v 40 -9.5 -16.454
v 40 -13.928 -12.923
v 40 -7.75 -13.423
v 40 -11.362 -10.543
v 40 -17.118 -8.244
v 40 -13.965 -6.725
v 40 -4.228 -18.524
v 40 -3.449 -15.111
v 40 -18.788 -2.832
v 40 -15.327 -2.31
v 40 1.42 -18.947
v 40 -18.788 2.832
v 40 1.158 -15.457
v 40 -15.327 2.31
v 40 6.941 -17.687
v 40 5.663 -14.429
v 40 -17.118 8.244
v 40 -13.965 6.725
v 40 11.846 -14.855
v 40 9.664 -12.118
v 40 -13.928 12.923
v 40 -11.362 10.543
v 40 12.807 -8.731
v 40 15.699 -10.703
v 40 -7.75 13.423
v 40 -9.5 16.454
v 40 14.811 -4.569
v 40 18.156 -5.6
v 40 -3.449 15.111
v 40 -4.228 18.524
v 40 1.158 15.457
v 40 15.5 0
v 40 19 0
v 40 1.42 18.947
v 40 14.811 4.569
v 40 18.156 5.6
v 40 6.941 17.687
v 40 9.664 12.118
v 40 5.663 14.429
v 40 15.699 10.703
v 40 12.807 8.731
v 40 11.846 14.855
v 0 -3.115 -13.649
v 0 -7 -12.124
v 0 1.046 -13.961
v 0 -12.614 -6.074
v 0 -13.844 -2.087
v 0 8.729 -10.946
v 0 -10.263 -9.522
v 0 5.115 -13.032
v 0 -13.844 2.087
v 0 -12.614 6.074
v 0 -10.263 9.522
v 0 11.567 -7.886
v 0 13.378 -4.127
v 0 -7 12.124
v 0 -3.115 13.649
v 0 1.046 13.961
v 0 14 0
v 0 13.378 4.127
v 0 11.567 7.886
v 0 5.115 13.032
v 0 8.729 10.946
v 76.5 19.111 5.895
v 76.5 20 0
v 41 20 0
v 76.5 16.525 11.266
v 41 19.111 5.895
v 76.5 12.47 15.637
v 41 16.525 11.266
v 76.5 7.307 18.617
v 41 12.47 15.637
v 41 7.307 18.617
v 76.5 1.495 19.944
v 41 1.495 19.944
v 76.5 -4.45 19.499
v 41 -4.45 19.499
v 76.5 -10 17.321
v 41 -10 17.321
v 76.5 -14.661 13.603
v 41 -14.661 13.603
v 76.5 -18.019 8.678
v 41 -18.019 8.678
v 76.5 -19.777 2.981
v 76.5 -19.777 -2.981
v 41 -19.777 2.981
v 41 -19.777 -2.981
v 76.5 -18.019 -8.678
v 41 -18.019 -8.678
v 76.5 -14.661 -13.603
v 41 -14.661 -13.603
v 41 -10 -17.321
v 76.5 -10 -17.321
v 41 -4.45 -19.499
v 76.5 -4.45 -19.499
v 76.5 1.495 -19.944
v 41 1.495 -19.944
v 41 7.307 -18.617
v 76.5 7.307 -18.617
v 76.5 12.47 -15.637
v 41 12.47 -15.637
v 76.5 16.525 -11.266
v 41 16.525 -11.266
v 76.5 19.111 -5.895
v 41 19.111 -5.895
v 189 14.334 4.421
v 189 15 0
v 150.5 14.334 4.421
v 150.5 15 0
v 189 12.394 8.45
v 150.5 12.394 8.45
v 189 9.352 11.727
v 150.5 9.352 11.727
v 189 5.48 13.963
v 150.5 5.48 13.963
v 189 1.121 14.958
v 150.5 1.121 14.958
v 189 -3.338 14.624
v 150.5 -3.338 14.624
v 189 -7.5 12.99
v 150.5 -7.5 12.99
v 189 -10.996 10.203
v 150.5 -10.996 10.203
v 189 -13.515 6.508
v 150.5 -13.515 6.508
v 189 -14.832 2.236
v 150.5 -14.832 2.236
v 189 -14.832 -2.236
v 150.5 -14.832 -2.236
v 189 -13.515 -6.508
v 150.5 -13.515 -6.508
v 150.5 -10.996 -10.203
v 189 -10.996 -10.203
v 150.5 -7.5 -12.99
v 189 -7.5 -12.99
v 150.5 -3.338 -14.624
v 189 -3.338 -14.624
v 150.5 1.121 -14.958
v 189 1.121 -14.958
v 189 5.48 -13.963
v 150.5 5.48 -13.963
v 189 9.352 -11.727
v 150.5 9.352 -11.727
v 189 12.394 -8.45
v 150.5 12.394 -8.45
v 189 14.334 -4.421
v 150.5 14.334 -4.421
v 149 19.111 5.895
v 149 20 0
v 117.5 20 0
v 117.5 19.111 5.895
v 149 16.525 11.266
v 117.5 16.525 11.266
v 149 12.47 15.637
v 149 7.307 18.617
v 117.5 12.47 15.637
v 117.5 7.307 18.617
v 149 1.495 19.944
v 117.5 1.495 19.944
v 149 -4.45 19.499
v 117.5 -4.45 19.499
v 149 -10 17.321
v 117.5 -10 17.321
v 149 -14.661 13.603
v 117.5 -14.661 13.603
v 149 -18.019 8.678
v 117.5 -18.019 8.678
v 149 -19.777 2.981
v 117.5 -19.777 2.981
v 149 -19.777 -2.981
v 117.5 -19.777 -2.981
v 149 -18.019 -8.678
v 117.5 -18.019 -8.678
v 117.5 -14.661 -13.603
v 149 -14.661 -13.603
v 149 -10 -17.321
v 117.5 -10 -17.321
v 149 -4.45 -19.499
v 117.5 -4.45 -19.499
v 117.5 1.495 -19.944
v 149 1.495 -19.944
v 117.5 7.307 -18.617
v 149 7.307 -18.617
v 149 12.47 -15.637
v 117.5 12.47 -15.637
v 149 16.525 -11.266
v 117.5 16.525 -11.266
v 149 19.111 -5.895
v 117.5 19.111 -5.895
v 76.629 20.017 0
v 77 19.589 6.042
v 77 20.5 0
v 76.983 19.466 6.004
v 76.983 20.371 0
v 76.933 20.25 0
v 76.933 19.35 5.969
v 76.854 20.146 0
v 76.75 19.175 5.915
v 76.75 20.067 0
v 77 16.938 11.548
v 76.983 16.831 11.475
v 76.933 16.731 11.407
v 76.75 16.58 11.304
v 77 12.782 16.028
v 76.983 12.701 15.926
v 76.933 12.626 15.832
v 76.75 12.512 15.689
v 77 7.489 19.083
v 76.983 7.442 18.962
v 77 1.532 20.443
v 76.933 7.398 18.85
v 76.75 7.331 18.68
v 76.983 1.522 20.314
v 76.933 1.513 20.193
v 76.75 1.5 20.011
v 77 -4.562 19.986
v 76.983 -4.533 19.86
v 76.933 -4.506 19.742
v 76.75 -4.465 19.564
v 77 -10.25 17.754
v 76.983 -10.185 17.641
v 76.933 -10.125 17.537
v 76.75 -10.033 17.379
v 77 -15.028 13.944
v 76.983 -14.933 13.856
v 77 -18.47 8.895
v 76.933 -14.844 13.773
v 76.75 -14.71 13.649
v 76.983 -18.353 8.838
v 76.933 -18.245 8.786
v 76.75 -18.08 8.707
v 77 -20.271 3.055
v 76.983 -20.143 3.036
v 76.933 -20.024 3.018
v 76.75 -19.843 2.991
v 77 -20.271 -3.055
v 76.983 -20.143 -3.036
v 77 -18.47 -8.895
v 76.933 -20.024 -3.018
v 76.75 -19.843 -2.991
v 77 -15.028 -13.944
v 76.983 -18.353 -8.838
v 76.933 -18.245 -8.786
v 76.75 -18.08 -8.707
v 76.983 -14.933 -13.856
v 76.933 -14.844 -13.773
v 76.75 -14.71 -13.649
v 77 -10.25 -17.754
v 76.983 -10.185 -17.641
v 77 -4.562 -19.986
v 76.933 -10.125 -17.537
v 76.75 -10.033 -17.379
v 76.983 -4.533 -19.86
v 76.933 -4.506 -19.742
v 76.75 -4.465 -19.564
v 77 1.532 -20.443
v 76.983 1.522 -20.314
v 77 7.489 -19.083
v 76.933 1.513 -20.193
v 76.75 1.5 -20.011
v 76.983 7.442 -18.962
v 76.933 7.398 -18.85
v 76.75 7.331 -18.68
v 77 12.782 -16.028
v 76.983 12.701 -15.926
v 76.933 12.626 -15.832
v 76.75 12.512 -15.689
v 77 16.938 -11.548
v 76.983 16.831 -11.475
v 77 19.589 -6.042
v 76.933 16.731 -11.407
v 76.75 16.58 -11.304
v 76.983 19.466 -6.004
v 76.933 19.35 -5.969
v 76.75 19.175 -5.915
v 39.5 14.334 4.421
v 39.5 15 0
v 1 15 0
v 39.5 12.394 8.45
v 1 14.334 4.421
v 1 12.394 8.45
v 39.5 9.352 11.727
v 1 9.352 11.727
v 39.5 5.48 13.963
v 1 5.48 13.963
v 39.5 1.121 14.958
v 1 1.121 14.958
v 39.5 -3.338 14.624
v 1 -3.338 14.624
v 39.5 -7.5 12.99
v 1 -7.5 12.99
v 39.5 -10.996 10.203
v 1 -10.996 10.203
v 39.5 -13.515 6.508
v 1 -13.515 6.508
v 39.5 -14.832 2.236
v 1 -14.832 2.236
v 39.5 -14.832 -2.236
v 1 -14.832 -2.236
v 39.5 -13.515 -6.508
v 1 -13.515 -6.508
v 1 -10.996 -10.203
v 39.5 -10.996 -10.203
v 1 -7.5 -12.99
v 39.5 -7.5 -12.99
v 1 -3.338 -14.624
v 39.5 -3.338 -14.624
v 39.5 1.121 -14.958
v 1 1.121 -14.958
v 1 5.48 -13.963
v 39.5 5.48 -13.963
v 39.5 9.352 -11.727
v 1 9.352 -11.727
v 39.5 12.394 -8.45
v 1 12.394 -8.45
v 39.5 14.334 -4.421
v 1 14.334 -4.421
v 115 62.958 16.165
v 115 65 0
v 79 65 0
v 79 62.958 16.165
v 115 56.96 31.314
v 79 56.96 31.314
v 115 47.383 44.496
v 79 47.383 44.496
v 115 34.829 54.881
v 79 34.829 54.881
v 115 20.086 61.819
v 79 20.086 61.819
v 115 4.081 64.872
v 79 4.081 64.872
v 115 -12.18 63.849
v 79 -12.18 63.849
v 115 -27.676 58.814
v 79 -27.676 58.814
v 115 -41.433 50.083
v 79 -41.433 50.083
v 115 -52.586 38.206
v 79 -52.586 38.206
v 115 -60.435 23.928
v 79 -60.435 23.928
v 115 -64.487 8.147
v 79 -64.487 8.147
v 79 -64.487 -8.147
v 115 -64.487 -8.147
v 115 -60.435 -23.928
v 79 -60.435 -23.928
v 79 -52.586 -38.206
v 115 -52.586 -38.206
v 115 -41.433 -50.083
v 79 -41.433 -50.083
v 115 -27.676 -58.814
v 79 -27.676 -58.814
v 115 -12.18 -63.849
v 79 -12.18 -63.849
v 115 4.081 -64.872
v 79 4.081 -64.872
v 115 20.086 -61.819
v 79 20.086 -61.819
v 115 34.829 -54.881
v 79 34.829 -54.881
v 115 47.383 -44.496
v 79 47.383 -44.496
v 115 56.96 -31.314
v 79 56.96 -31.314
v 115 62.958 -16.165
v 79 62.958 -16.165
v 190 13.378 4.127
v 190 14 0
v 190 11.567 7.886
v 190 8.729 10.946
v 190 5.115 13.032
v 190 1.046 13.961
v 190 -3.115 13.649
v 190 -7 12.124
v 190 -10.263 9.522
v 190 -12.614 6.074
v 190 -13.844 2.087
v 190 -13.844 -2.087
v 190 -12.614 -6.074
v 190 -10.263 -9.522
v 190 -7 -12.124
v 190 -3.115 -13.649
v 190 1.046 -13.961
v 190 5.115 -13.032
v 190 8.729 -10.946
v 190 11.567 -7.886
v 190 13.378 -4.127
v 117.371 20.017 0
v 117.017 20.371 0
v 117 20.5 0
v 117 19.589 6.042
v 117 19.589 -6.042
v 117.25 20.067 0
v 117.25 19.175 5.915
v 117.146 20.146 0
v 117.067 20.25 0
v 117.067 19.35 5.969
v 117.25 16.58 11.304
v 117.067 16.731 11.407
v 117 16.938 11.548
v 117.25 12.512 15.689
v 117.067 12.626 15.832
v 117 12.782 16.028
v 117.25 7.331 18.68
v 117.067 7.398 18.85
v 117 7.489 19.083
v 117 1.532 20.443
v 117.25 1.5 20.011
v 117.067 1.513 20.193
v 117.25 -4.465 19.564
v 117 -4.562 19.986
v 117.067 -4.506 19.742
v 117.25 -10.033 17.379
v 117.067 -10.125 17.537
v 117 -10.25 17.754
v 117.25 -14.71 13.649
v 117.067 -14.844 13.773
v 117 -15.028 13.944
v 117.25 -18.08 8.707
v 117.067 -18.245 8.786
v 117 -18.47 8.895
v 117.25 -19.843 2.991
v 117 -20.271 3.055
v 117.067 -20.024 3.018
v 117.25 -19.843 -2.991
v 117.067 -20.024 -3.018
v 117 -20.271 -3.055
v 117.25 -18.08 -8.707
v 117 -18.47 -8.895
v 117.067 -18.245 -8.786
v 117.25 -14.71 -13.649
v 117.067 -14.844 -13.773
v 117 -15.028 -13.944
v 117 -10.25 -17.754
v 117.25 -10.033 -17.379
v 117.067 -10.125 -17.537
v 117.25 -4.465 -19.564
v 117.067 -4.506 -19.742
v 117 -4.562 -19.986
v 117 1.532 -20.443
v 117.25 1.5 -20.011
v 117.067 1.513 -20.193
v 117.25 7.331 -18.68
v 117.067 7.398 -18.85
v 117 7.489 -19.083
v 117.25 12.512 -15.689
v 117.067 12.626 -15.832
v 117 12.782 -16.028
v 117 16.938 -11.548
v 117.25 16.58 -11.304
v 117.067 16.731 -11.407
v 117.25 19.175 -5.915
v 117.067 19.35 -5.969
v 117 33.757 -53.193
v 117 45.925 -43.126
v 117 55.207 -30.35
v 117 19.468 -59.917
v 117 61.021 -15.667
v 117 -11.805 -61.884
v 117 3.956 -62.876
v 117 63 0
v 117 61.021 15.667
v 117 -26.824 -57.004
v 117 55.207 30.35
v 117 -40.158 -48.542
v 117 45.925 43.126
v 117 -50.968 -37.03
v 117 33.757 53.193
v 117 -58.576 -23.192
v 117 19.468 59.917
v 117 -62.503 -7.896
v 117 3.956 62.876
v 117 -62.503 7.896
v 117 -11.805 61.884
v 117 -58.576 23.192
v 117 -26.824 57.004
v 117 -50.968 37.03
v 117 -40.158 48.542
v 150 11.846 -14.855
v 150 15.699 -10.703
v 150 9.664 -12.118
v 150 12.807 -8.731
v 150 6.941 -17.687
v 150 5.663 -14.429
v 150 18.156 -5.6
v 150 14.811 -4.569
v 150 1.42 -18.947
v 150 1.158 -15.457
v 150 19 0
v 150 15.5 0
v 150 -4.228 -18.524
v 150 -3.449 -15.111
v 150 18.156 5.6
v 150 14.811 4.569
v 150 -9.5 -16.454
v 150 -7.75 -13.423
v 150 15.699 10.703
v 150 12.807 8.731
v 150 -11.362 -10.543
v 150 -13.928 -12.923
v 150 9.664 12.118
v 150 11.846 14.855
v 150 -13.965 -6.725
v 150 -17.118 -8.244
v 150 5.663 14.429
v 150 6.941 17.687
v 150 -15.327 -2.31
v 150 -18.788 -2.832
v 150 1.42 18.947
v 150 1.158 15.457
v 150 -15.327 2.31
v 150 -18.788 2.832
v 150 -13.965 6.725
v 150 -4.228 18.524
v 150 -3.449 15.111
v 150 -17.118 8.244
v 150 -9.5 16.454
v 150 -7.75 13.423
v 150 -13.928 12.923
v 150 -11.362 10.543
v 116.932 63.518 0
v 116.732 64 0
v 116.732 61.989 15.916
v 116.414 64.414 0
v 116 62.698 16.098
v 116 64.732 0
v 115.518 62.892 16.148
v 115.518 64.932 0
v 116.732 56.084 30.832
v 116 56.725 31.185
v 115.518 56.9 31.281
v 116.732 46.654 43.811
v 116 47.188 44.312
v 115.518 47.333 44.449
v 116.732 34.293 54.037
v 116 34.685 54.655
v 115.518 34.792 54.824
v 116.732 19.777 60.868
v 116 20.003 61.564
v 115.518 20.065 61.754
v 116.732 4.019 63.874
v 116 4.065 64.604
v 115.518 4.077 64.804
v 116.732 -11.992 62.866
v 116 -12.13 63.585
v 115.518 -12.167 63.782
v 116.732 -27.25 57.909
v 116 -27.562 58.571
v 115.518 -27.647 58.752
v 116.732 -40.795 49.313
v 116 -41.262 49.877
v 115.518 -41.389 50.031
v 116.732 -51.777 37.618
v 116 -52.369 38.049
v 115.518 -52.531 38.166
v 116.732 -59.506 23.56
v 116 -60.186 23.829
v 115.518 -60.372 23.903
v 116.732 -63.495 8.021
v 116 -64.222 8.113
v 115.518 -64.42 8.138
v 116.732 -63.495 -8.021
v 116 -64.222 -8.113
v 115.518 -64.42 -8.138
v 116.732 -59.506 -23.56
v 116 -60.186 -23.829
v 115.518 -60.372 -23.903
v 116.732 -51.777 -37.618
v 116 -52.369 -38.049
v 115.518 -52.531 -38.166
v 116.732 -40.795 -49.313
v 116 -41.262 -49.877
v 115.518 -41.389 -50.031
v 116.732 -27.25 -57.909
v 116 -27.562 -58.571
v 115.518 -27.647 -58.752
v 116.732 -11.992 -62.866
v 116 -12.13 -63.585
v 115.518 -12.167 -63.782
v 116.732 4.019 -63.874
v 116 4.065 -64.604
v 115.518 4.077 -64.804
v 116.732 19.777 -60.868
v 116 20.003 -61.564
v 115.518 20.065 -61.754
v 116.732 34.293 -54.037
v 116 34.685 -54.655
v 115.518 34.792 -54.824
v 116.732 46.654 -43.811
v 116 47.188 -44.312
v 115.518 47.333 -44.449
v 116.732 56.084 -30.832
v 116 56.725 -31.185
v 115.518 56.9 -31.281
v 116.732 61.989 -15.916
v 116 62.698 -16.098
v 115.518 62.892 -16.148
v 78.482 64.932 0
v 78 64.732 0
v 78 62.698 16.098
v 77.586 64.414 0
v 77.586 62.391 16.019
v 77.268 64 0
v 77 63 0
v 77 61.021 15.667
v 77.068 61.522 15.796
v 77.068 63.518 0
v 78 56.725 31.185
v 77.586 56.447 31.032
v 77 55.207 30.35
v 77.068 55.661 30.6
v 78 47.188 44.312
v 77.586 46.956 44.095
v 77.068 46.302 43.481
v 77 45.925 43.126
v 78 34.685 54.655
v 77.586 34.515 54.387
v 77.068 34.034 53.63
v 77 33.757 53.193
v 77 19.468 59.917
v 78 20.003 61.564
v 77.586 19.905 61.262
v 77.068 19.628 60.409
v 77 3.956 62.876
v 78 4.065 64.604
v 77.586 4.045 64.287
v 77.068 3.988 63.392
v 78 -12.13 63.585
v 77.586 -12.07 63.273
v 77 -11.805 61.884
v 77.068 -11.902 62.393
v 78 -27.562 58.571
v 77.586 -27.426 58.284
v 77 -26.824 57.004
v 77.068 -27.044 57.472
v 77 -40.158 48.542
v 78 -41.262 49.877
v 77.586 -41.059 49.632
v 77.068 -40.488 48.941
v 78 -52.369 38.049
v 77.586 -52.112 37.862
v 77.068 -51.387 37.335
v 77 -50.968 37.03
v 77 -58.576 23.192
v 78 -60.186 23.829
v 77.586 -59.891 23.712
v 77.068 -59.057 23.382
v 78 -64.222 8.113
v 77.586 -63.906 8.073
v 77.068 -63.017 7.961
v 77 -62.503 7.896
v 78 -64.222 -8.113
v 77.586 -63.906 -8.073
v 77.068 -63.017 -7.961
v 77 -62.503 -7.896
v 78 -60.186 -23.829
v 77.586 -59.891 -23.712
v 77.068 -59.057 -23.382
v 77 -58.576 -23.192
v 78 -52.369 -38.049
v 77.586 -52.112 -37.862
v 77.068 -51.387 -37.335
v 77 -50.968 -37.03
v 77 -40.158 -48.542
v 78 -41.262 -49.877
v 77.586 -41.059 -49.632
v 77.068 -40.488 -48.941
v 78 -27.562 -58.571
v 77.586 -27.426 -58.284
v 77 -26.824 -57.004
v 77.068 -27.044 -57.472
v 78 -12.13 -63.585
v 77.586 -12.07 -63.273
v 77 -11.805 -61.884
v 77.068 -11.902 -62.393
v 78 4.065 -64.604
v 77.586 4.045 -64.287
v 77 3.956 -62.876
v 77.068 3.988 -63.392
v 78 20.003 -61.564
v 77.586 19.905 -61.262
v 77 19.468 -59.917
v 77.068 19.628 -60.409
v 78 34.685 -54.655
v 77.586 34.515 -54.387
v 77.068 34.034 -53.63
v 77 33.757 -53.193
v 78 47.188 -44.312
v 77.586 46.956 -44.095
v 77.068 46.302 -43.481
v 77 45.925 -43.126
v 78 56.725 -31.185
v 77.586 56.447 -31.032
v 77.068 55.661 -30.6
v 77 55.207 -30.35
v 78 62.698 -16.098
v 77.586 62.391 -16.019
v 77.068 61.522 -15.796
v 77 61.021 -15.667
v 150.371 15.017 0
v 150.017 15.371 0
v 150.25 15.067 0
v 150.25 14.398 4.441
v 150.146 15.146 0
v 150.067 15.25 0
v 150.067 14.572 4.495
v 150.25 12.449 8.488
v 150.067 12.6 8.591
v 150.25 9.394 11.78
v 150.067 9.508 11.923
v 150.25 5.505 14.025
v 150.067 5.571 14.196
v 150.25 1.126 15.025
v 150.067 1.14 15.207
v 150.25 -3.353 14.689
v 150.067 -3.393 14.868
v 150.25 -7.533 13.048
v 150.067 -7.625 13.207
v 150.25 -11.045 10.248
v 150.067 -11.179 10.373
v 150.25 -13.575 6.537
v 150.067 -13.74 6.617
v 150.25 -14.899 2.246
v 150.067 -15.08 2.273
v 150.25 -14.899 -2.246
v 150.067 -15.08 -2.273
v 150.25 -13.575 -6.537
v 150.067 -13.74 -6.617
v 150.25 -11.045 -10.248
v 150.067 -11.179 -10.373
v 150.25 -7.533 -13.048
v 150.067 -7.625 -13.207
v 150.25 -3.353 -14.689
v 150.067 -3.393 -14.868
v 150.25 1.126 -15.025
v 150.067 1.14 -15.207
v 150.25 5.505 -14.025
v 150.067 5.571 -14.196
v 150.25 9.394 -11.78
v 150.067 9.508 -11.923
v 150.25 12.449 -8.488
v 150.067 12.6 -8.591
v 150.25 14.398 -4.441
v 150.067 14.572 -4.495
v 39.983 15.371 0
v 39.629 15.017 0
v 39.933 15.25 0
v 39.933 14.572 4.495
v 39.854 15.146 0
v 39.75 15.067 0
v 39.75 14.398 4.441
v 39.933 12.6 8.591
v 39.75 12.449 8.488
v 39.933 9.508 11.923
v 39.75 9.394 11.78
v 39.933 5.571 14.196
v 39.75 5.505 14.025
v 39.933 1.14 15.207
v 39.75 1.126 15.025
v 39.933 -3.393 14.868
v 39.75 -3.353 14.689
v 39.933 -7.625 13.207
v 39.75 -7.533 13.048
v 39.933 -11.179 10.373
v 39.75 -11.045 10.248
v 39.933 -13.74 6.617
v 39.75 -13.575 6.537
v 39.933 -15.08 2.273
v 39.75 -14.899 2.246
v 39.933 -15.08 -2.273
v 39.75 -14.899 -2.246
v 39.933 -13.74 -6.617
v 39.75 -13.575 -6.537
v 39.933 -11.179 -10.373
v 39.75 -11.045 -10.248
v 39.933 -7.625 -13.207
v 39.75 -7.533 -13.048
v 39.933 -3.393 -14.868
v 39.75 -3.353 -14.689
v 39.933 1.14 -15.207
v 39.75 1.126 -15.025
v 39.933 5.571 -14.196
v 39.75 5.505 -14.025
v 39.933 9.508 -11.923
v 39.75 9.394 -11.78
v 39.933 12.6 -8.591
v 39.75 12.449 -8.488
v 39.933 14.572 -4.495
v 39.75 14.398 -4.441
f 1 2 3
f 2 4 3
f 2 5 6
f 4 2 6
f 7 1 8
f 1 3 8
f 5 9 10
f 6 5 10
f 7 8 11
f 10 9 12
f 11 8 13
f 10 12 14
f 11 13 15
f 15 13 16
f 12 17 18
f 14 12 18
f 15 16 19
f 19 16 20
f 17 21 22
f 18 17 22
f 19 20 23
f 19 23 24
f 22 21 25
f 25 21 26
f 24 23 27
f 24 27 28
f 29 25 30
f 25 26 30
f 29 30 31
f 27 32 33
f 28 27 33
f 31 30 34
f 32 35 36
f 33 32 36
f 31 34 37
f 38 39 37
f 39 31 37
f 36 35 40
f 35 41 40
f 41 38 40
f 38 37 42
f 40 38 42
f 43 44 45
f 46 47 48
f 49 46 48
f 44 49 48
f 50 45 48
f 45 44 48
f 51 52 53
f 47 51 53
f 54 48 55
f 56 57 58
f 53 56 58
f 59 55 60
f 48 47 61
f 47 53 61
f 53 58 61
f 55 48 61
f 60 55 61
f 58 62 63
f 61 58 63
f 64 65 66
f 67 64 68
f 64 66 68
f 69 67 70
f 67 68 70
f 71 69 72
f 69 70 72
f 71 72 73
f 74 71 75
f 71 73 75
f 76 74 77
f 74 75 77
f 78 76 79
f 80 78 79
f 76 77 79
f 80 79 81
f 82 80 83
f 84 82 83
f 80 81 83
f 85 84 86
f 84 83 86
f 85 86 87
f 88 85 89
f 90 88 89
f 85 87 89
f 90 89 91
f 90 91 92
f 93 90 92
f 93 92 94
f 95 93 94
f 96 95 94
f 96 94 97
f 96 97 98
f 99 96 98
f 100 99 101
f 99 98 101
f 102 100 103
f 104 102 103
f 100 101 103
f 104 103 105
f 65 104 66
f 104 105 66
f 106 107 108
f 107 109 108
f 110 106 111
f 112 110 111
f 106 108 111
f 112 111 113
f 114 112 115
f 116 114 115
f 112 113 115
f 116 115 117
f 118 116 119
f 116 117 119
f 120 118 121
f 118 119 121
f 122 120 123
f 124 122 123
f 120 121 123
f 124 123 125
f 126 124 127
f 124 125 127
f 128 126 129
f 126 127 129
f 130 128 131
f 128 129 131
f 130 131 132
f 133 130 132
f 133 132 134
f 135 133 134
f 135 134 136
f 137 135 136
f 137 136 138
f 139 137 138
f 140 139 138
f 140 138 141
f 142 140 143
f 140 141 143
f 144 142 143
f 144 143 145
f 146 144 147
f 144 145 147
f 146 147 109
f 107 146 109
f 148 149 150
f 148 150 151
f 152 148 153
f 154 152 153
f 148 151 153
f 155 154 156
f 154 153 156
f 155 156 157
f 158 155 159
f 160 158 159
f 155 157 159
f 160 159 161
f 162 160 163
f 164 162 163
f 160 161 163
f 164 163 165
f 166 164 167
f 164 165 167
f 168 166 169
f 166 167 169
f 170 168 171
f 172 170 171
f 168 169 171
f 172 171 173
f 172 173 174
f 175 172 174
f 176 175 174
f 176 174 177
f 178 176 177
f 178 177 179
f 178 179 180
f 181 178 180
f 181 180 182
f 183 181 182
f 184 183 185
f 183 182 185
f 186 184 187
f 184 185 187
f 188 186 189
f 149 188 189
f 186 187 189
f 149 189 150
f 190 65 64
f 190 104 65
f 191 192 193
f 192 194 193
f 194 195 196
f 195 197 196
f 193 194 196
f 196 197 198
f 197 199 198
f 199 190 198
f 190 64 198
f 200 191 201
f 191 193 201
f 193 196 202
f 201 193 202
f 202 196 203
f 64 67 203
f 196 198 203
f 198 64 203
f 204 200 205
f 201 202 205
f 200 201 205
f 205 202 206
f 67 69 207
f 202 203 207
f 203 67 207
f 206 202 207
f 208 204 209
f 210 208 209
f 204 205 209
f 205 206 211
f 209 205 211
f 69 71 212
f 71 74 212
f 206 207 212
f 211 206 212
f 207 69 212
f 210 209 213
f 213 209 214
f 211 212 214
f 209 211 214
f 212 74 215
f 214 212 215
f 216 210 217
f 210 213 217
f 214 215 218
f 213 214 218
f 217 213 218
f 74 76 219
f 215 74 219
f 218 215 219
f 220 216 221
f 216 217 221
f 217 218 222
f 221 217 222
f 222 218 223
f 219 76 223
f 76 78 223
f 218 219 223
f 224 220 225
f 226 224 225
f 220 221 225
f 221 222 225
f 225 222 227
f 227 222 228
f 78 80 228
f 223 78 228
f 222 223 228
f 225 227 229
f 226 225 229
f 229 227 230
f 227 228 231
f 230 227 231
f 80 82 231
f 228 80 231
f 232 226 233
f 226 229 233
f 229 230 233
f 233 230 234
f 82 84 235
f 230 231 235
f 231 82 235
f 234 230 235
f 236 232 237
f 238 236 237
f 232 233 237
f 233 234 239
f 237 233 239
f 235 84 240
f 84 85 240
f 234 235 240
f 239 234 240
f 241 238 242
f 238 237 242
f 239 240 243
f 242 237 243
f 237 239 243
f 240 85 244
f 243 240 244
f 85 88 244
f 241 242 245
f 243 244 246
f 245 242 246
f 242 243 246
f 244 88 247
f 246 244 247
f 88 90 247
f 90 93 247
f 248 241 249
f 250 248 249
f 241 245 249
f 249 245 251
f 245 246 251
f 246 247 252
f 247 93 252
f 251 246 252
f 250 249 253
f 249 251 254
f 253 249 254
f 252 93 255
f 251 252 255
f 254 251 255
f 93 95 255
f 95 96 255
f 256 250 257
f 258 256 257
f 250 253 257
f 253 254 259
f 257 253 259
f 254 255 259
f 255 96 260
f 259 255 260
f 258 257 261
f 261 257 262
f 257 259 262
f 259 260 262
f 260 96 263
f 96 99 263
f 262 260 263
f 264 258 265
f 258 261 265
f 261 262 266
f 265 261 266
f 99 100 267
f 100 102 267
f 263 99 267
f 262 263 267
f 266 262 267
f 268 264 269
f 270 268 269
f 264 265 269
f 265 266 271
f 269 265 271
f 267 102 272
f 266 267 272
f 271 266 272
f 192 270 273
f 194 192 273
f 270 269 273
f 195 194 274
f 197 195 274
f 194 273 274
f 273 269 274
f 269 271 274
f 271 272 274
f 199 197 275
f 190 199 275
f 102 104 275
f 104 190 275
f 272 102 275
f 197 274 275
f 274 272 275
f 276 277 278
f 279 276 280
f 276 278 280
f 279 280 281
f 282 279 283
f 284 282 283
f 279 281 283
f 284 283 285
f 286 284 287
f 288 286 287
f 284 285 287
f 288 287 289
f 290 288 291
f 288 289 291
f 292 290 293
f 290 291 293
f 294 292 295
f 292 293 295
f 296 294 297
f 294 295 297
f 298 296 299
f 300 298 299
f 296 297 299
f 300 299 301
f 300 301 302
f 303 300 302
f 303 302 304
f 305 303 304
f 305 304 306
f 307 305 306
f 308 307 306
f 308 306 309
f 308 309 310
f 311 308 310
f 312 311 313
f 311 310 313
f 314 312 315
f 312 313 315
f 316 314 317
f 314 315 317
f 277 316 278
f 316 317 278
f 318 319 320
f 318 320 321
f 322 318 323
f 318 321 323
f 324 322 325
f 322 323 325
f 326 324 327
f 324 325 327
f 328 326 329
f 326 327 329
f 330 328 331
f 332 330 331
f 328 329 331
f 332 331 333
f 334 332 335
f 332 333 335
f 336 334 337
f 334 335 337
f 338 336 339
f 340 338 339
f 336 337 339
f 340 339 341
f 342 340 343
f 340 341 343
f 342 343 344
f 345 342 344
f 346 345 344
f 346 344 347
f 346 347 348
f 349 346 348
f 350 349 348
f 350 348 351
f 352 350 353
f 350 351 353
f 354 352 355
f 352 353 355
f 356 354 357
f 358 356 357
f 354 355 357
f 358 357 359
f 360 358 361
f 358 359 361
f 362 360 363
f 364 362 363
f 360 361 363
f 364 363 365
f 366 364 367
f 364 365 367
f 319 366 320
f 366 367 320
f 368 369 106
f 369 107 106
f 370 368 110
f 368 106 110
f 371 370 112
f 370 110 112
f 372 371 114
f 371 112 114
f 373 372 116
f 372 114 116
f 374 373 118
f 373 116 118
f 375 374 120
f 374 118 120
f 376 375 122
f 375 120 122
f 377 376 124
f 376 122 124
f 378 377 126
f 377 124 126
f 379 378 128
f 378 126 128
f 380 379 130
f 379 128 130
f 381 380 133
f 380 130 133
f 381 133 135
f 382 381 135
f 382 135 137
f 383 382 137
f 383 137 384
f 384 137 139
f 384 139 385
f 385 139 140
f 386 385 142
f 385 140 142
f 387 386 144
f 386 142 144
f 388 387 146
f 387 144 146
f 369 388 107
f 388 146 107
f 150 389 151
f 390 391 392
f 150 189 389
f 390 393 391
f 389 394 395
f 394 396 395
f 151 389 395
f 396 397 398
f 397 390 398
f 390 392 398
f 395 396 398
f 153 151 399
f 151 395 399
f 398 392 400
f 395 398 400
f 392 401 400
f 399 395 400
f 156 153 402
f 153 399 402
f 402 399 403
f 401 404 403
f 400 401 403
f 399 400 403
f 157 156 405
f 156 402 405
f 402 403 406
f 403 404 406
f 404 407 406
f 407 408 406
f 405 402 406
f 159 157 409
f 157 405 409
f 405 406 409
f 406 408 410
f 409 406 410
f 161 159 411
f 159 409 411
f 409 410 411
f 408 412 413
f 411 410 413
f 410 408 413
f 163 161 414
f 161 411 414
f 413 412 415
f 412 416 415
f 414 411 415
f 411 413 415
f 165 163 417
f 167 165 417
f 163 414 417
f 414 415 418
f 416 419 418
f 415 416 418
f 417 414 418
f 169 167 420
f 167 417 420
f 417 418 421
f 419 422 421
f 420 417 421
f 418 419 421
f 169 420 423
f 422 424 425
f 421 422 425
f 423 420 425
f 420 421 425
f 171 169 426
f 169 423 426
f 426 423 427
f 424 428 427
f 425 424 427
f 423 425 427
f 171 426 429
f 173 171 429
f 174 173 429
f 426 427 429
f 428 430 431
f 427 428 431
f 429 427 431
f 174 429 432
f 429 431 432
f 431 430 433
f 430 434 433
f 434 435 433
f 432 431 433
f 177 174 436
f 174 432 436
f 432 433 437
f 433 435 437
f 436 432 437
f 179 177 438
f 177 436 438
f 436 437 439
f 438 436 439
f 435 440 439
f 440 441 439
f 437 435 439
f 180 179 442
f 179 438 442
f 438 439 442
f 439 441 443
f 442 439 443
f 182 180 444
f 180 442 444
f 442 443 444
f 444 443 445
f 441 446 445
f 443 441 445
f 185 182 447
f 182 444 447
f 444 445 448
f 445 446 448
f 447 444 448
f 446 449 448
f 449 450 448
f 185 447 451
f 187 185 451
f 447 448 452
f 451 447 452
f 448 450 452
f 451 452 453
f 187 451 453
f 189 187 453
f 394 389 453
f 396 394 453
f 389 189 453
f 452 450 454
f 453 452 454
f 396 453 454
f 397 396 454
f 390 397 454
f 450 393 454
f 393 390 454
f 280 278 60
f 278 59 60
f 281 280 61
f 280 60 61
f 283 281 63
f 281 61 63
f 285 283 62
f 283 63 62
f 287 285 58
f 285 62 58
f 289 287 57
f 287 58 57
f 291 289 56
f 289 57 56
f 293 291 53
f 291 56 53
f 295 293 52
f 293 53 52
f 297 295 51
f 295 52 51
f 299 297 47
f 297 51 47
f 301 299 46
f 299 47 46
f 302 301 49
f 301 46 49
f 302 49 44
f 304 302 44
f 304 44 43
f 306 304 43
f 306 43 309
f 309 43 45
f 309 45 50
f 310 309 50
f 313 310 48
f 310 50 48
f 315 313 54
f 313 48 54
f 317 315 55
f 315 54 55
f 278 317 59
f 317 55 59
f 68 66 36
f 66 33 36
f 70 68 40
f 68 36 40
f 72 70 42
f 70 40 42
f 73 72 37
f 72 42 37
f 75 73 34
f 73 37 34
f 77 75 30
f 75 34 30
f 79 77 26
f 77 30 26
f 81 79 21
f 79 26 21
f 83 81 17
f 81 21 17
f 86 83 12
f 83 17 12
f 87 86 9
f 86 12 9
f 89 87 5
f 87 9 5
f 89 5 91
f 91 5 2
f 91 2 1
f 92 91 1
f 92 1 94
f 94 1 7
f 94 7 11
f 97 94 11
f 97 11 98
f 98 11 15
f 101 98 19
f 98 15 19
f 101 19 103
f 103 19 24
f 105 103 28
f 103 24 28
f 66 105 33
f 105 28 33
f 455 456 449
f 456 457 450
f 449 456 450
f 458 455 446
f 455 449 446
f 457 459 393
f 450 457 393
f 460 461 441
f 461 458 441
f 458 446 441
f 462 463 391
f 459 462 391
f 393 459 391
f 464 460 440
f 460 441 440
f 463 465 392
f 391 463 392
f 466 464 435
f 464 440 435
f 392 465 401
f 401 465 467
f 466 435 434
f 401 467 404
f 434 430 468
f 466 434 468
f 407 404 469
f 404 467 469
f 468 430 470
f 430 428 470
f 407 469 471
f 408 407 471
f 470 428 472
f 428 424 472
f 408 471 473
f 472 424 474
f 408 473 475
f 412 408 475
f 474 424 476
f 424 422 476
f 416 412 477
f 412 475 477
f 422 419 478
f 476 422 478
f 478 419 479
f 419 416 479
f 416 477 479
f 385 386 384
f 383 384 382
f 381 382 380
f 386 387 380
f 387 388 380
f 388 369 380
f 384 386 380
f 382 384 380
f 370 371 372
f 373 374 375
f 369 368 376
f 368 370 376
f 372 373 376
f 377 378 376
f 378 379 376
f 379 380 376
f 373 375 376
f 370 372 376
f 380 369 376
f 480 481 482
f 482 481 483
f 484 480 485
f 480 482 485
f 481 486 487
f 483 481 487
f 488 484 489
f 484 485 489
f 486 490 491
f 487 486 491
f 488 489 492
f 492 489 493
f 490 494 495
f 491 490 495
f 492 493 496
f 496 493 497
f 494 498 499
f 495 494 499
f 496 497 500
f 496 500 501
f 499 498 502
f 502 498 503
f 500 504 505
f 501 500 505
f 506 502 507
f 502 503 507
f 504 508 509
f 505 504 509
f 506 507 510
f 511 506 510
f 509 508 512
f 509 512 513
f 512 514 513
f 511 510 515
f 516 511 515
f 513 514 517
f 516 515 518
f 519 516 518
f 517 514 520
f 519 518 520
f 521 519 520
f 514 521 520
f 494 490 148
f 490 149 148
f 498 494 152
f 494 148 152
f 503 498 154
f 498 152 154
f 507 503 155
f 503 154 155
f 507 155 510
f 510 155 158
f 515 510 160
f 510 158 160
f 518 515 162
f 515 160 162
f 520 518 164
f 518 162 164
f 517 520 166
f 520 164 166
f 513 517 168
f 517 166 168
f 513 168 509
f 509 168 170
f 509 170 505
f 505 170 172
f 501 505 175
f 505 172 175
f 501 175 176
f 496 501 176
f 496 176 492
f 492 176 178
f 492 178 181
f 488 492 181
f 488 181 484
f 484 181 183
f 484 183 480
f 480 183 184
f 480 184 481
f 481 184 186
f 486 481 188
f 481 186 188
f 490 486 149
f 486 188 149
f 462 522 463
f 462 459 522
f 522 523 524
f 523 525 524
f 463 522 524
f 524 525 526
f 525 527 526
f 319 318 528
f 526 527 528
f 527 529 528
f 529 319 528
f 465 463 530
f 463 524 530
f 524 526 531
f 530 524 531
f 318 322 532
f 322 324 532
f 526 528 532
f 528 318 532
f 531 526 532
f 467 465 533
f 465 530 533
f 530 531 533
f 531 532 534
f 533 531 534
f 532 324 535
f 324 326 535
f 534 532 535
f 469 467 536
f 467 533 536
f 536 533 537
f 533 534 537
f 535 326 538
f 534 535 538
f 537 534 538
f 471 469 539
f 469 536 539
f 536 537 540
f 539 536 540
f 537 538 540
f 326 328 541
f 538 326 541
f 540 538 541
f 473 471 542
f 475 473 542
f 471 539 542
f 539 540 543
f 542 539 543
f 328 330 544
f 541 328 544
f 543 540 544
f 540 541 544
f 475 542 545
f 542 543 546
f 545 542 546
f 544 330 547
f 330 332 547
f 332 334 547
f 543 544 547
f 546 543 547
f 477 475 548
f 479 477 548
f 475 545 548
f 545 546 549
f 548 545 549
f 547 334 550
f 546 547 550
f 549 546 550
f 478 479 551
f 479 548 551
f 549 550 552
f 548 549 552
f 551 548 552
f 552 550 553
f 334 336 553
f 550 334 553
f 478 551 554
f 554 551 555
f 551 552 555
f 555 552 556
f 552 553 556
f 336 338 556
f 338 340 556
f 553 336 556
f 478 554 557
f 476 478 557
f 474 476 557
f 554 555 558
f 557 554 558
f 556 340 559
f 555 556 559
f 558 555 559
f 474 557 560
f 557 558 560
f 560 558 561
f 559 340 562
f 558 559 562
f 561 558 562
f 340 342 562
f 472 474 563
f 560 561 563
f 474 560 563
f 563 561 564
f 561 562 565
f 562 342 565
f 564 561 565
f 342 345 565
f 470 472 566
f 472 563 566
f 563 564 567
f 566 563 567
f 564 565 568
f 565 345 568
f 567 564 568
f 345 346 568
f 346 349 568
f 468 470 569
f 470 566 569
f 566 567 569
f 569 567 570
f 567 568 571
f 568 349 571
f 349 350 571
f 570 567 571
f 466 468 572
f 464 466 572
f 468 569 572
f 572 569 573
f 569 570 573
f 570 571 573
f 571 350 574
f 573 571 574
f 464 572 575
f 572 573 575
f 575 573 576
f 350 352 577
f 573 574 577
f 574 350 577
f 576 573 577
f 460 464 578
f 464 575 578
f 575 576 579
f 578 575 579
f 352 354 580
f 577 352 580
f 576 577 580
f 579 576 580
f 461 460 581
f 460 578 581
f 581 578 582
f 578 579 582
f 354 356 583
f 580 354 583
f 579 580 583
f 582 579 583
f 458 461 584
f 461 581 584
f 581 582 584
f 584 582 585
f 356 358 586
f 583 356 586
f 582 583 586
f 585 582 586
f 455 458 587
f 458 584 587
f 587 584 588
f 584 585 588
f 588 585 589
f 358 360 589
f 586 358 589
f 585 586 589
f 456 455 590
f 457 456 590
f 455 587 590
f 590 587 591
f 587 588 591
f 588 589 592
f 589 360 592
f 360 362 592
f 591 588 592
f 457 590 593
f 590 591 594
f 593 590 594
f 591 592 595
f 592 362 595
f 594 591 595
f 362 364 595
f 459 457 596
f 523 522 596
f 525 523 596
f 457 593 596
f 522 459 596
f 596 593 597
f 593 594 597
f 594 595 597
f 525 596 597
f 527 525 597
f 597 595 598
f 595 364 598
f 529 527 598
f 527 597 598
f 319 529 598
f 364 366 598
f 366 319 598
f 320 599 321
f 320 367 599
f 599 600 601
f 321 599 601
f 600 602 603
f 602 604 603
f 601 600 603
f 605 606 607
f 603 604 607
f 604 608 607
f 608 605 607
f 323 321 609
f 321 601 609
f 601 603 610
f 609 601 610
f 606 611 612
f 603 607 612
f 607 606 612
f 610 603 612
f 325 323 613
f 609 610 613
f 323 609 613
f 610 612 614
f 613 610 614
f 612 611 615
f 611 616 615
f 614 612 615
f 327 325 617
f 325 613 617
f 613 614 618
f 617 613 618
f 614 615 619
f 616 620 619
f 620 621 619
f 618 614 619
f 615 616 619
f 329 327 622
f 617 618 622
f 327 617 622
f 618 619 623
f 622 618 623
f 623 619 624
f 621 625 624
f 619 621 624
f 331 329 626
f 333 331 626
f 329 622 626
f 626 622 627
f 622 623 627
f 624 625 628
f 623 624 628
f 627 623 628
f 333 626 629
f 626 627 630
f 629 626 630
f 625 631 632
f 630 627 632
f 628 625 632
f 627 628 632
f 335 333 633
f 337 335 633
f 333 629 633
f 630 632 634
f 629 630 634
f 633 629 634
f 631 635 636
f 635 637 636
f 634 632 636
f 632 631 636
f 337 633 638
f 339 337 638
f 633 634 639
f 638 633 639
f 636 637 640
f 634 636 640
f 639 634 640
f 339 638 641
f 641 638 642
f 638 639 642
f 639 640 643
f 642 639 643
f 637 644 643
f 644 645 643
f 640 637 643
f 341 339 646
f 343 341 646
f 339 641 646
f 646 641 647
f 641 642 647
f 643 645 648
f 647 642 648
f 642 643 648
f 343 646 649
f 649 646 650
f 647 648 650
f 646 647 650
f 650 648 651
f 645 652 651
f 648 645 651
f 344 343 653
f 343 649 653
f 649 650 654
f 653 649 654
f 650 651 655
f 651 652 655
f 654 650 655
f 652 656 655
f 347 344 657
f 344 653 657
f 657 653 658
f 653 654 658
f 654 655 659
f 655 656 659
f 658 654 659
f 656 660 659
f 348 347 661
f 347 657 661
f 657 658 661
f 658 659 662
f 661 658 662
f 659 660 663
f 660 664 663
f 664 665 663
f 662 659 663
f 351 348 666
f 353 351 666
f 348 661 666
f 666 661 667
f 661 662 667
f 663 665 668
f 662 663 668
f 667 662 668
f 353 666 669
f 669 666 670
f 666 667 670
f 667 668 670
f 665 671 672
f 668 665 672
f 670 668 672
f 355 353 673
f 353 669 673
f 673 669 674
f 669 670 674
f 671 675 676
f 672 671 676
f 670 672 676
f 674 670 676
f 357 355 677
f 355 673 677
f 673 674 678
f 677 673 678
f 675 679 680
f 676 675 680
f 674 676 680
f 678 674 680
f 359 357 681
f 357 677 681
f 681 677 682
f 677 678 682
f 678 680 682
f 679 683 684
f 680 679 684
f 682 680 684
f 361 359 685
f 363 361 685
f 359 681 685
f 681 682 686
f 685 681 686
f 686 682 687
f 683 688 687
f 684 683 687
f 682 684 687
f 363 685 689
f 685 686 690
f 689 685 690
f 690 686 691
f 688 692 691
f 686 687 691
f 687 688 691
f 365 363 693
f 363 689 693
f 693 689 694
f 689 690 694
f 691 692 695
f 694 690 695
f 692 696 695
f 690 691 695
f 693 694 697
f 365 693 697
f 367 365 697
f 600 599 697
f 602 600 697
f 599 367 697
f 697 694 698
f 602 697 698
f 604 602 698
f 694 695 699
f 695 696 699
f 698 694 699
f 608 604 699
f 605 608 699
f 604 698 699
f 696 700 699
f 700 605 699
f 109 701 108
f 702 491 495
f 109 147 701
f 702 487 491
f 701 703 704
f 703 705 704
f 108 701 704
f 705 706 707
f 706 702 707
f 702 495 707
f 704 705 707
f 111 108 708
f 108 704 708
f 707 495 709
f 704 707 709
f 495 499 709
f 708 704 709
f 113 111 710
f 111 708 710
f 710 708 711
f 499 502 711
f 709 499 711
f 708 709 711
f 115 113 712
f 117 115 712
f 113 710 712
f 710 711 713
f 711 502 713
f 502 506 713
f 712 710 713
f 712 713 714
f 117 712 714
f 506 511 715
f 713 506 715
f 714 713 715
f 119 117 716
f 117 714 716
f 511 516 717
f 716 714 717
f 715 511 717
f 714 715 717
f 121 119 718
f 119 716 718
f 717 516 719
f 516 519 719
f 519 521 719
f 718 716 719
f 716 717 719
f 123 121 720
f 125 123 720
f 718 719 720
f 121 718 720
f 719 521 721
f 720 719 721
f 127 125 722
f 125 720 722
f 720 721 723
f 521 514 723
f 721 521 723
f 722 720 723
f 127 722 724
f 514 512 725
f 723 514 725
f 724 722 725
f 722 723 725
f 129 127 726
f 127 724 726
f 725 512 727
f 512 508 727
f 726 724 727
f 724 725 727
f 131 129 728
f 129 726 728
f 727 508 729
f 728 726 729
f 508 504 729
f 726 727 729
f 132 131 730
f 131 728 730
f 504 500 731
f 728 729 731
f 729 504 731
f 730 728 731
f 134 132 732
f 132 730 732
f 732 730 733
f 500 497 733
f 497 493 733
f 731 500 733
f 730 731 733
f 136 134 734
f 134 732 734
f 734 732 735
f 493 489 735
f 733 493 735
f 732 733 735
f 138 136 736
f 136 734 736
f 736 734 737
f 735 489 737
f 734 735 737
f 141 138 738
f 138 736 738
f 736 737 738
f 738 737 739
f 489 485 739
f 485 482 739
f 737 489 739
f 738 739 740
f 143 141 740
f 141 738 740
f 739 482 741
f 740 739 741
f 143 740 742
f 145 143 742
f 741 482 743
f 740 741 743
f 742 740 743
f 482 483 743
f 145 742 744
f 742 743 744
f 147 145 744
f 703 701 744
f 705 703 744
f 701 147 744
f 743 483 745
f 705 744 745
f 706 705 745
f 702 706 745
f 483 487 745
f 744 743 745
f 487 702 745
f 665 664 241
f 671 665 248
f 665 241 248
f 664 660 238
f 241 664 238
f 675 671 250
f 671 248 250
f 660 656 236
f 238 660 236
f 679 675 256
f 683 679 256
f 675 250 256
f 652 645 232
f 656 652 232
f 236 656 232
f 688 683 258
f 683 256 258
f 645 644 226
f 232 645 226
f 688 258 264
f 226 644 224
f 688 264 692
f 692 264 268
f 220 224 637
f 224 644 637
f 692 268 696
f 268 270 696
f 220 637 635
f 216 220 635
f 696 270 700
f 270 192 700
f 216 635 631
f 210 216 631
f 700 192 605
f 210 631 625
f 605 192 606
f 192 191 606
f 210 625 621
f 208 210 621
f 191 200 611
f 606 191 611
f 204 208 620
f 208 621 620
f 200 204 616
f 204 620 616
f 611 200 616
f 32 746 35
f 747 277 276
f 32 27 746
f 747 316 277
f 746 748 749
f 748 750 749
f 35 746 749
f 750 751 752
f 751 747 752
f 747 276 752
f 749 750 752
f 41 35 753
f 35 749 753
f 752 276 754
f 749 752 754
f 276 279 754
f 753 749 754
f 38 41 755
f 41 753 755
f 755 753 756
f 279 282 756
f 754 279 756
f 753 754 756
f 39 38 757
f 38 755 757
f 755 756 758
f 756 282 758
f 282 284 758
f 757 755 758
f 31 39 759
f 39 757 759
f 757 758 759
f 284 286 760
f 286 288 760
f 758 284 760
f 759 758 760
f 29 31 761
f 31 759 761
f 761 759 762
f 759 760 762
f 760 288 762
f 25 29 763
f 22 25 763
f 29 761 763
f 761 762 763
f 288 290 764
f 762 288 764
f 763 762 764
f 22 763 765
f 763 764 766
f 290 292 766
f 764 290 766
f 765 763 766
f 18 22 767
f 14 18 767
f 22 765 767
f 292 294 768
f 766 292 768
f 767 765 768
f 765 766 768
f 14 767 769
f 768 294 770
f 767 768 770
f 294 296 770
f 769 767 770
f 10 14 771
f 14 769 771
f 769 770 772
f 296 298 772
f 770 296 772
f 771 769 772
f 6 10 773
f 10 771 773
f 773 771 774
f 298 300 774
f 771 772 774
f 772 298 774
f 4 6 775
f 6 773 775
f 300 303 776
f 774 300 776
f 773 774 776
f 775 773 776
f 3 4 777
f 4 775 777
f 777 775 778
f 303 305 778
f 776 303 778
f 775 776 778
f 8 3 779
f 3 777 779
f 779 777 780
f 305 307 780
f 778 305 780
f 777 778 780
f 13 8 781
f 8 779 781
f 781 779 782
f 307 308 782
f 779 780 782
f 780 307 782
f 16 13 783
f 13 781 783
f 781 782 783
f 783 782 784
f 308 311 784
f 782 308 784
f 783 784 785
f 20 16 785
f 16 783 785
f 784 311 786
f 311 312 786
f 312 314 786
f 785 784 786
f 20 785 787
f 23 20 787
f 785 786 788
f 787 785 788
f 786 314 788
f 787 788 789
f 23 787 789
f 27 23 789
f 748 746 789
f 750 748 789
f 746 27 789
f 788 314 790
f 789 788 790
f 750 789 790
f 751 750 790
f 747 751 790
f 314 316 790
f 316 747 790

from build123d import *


with BuildPart() as part:
    # 草图1 → 旋转1 (revolve)
    with BuildSketch(Plane.XY):
        with BuildLine():
            Line((0, 0), (190, 0))
            Line((190, 0), (190, 14))
            Line((190, 14), (189, 15))
            Line((189, 15), (150.5, 15))
            ThreePointArc((150.5, 15), (150.146446609, 15.146446609), (150, 15.5))
            Line((150, 15.5), (150, 19))
            Line((150, 19), (149, 20))
            Line((149, 20), (117.5, 20))
            ThreePointArc((117.5, 20), (117.146446609, 20.146446609), (117, 20.5))
            Line((117, 20.5), (117, 63))
            ThreePointArc((117, 63), (116.414213562, 64.414213562), (115, 65))
            Line((115, 65), (79, 65))
            ThreePointArc((79, 65), (77.585786438, 64.414213562), (77, 63))
            Line((77, 63), (77, 20.5))
            ThreePointArc((77, 20.5), (76.853553391, 20.146446609), (76.5, 20))
            Line((76.5, 20), (41, 20))
            Line((41, 20), (40, 19))
            Line((40, 19), (40, 15.5))
            ThreePointArc((40, 15.5), (39.853553391, 15.146446609), (39.5, 15))
            Line((39.5, 15), (1, 15))
            Line((1, 15), (0, 14))
            Line((0, 14), (0, 0))
        make_face()
    revolve(axis=Axis((0, 0, 0), (1, 0, 0)))


solid = part.part
